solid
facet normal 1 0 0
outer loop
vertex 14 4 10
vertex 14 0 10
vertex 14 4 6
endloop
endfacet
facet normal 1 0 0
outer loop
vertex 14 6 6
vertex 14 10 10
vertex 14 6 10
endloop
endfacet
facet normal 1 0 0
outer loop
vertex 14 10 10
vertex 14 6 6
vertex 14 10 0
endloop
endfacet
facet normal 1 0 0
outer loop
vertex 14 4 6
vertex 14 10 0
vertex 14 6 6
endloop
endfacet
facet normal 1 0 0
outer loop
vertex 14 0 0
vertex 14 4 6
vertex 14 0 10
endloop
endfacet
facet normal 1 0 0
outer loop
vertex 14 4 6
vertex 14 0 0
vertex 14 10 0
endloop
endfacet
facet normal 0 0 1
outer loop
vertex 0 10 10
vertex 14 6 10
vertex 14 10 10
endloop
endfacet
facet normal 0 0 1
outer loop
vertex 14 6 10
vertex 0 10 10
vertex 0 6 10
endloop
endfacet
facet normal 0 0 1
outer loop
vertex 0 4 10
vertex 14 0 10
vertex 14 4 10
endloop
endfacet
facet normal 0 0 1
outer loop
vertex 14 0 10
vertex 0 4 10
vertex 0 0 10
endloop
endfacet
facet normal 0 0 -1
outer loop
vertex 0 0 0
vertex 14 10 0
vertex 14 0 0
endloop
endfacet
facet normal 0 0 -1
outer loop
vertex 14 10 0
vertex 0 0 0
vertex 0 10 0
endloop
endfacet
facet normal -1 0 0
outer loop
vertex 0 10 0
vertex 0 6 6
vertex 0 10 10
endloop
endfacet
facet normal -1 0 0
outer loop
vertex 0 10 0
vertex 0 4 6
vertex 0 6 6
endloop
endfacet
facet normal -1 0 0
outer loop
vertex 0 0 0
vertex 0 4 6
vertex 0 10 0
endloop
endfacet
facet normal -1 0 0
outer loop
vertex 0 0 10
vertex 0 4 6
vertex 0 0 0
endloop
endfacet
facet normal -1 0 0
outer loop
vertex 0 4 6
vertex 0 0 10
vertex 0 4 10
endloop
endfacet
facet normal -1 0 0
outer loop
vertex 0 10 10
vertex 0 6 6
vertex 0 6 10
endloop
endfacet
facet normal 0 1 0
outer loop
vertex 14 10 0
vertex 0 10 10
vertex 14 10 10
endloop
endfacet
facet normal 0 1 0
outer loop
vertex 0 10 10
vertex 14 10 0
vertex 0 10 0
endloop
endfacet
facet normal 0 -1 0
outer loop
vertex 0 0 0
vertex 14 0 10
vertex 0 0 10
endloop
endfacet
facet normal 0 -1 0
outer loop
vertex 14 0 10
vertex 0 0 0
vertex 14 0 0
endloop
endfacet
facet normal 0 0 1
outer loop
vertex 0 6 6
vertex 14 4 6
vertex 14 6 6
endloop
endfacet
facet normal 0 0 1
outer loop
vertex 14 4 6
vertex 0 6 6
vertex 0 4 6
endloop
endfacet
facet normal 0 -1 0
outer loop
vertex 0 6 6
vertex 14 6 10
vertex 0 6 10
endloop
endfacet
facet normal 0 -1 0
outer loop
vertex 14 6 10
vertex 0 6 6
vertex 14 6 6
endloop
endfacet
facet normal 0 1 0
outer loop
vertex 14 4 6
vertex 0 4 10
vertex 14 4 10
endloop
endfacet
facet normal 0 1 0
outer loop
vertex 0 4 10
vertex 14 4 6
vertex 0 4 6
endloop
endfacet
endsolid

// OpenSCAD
$fn = 32;

// ----------------------------------------------------------------------
// Micro clip: slotted block, 5-20 mm class
// ----------------------------------------------------------------------

// --- parameters (mm) ---
block_l = 14;             // block length, X
block_w = 10;             // block width, Y
block_h = 10;             // block height, Z
slot_w = 2;               // slot width
slot_d = 4;               // slot depth from the top
fit_tol = 0.05;           // tolerance for press fits, mm
free_tol = 0.2;           // tolerance for clearance fits, mm

difference() {
  cube([block_l, block_w, block_h]);
  translate([-1, block_w / 2 - slot_w / 2, block_h - slot_d])
    cube([block_l + 2, slot_w, slot_d + 1]);
}
